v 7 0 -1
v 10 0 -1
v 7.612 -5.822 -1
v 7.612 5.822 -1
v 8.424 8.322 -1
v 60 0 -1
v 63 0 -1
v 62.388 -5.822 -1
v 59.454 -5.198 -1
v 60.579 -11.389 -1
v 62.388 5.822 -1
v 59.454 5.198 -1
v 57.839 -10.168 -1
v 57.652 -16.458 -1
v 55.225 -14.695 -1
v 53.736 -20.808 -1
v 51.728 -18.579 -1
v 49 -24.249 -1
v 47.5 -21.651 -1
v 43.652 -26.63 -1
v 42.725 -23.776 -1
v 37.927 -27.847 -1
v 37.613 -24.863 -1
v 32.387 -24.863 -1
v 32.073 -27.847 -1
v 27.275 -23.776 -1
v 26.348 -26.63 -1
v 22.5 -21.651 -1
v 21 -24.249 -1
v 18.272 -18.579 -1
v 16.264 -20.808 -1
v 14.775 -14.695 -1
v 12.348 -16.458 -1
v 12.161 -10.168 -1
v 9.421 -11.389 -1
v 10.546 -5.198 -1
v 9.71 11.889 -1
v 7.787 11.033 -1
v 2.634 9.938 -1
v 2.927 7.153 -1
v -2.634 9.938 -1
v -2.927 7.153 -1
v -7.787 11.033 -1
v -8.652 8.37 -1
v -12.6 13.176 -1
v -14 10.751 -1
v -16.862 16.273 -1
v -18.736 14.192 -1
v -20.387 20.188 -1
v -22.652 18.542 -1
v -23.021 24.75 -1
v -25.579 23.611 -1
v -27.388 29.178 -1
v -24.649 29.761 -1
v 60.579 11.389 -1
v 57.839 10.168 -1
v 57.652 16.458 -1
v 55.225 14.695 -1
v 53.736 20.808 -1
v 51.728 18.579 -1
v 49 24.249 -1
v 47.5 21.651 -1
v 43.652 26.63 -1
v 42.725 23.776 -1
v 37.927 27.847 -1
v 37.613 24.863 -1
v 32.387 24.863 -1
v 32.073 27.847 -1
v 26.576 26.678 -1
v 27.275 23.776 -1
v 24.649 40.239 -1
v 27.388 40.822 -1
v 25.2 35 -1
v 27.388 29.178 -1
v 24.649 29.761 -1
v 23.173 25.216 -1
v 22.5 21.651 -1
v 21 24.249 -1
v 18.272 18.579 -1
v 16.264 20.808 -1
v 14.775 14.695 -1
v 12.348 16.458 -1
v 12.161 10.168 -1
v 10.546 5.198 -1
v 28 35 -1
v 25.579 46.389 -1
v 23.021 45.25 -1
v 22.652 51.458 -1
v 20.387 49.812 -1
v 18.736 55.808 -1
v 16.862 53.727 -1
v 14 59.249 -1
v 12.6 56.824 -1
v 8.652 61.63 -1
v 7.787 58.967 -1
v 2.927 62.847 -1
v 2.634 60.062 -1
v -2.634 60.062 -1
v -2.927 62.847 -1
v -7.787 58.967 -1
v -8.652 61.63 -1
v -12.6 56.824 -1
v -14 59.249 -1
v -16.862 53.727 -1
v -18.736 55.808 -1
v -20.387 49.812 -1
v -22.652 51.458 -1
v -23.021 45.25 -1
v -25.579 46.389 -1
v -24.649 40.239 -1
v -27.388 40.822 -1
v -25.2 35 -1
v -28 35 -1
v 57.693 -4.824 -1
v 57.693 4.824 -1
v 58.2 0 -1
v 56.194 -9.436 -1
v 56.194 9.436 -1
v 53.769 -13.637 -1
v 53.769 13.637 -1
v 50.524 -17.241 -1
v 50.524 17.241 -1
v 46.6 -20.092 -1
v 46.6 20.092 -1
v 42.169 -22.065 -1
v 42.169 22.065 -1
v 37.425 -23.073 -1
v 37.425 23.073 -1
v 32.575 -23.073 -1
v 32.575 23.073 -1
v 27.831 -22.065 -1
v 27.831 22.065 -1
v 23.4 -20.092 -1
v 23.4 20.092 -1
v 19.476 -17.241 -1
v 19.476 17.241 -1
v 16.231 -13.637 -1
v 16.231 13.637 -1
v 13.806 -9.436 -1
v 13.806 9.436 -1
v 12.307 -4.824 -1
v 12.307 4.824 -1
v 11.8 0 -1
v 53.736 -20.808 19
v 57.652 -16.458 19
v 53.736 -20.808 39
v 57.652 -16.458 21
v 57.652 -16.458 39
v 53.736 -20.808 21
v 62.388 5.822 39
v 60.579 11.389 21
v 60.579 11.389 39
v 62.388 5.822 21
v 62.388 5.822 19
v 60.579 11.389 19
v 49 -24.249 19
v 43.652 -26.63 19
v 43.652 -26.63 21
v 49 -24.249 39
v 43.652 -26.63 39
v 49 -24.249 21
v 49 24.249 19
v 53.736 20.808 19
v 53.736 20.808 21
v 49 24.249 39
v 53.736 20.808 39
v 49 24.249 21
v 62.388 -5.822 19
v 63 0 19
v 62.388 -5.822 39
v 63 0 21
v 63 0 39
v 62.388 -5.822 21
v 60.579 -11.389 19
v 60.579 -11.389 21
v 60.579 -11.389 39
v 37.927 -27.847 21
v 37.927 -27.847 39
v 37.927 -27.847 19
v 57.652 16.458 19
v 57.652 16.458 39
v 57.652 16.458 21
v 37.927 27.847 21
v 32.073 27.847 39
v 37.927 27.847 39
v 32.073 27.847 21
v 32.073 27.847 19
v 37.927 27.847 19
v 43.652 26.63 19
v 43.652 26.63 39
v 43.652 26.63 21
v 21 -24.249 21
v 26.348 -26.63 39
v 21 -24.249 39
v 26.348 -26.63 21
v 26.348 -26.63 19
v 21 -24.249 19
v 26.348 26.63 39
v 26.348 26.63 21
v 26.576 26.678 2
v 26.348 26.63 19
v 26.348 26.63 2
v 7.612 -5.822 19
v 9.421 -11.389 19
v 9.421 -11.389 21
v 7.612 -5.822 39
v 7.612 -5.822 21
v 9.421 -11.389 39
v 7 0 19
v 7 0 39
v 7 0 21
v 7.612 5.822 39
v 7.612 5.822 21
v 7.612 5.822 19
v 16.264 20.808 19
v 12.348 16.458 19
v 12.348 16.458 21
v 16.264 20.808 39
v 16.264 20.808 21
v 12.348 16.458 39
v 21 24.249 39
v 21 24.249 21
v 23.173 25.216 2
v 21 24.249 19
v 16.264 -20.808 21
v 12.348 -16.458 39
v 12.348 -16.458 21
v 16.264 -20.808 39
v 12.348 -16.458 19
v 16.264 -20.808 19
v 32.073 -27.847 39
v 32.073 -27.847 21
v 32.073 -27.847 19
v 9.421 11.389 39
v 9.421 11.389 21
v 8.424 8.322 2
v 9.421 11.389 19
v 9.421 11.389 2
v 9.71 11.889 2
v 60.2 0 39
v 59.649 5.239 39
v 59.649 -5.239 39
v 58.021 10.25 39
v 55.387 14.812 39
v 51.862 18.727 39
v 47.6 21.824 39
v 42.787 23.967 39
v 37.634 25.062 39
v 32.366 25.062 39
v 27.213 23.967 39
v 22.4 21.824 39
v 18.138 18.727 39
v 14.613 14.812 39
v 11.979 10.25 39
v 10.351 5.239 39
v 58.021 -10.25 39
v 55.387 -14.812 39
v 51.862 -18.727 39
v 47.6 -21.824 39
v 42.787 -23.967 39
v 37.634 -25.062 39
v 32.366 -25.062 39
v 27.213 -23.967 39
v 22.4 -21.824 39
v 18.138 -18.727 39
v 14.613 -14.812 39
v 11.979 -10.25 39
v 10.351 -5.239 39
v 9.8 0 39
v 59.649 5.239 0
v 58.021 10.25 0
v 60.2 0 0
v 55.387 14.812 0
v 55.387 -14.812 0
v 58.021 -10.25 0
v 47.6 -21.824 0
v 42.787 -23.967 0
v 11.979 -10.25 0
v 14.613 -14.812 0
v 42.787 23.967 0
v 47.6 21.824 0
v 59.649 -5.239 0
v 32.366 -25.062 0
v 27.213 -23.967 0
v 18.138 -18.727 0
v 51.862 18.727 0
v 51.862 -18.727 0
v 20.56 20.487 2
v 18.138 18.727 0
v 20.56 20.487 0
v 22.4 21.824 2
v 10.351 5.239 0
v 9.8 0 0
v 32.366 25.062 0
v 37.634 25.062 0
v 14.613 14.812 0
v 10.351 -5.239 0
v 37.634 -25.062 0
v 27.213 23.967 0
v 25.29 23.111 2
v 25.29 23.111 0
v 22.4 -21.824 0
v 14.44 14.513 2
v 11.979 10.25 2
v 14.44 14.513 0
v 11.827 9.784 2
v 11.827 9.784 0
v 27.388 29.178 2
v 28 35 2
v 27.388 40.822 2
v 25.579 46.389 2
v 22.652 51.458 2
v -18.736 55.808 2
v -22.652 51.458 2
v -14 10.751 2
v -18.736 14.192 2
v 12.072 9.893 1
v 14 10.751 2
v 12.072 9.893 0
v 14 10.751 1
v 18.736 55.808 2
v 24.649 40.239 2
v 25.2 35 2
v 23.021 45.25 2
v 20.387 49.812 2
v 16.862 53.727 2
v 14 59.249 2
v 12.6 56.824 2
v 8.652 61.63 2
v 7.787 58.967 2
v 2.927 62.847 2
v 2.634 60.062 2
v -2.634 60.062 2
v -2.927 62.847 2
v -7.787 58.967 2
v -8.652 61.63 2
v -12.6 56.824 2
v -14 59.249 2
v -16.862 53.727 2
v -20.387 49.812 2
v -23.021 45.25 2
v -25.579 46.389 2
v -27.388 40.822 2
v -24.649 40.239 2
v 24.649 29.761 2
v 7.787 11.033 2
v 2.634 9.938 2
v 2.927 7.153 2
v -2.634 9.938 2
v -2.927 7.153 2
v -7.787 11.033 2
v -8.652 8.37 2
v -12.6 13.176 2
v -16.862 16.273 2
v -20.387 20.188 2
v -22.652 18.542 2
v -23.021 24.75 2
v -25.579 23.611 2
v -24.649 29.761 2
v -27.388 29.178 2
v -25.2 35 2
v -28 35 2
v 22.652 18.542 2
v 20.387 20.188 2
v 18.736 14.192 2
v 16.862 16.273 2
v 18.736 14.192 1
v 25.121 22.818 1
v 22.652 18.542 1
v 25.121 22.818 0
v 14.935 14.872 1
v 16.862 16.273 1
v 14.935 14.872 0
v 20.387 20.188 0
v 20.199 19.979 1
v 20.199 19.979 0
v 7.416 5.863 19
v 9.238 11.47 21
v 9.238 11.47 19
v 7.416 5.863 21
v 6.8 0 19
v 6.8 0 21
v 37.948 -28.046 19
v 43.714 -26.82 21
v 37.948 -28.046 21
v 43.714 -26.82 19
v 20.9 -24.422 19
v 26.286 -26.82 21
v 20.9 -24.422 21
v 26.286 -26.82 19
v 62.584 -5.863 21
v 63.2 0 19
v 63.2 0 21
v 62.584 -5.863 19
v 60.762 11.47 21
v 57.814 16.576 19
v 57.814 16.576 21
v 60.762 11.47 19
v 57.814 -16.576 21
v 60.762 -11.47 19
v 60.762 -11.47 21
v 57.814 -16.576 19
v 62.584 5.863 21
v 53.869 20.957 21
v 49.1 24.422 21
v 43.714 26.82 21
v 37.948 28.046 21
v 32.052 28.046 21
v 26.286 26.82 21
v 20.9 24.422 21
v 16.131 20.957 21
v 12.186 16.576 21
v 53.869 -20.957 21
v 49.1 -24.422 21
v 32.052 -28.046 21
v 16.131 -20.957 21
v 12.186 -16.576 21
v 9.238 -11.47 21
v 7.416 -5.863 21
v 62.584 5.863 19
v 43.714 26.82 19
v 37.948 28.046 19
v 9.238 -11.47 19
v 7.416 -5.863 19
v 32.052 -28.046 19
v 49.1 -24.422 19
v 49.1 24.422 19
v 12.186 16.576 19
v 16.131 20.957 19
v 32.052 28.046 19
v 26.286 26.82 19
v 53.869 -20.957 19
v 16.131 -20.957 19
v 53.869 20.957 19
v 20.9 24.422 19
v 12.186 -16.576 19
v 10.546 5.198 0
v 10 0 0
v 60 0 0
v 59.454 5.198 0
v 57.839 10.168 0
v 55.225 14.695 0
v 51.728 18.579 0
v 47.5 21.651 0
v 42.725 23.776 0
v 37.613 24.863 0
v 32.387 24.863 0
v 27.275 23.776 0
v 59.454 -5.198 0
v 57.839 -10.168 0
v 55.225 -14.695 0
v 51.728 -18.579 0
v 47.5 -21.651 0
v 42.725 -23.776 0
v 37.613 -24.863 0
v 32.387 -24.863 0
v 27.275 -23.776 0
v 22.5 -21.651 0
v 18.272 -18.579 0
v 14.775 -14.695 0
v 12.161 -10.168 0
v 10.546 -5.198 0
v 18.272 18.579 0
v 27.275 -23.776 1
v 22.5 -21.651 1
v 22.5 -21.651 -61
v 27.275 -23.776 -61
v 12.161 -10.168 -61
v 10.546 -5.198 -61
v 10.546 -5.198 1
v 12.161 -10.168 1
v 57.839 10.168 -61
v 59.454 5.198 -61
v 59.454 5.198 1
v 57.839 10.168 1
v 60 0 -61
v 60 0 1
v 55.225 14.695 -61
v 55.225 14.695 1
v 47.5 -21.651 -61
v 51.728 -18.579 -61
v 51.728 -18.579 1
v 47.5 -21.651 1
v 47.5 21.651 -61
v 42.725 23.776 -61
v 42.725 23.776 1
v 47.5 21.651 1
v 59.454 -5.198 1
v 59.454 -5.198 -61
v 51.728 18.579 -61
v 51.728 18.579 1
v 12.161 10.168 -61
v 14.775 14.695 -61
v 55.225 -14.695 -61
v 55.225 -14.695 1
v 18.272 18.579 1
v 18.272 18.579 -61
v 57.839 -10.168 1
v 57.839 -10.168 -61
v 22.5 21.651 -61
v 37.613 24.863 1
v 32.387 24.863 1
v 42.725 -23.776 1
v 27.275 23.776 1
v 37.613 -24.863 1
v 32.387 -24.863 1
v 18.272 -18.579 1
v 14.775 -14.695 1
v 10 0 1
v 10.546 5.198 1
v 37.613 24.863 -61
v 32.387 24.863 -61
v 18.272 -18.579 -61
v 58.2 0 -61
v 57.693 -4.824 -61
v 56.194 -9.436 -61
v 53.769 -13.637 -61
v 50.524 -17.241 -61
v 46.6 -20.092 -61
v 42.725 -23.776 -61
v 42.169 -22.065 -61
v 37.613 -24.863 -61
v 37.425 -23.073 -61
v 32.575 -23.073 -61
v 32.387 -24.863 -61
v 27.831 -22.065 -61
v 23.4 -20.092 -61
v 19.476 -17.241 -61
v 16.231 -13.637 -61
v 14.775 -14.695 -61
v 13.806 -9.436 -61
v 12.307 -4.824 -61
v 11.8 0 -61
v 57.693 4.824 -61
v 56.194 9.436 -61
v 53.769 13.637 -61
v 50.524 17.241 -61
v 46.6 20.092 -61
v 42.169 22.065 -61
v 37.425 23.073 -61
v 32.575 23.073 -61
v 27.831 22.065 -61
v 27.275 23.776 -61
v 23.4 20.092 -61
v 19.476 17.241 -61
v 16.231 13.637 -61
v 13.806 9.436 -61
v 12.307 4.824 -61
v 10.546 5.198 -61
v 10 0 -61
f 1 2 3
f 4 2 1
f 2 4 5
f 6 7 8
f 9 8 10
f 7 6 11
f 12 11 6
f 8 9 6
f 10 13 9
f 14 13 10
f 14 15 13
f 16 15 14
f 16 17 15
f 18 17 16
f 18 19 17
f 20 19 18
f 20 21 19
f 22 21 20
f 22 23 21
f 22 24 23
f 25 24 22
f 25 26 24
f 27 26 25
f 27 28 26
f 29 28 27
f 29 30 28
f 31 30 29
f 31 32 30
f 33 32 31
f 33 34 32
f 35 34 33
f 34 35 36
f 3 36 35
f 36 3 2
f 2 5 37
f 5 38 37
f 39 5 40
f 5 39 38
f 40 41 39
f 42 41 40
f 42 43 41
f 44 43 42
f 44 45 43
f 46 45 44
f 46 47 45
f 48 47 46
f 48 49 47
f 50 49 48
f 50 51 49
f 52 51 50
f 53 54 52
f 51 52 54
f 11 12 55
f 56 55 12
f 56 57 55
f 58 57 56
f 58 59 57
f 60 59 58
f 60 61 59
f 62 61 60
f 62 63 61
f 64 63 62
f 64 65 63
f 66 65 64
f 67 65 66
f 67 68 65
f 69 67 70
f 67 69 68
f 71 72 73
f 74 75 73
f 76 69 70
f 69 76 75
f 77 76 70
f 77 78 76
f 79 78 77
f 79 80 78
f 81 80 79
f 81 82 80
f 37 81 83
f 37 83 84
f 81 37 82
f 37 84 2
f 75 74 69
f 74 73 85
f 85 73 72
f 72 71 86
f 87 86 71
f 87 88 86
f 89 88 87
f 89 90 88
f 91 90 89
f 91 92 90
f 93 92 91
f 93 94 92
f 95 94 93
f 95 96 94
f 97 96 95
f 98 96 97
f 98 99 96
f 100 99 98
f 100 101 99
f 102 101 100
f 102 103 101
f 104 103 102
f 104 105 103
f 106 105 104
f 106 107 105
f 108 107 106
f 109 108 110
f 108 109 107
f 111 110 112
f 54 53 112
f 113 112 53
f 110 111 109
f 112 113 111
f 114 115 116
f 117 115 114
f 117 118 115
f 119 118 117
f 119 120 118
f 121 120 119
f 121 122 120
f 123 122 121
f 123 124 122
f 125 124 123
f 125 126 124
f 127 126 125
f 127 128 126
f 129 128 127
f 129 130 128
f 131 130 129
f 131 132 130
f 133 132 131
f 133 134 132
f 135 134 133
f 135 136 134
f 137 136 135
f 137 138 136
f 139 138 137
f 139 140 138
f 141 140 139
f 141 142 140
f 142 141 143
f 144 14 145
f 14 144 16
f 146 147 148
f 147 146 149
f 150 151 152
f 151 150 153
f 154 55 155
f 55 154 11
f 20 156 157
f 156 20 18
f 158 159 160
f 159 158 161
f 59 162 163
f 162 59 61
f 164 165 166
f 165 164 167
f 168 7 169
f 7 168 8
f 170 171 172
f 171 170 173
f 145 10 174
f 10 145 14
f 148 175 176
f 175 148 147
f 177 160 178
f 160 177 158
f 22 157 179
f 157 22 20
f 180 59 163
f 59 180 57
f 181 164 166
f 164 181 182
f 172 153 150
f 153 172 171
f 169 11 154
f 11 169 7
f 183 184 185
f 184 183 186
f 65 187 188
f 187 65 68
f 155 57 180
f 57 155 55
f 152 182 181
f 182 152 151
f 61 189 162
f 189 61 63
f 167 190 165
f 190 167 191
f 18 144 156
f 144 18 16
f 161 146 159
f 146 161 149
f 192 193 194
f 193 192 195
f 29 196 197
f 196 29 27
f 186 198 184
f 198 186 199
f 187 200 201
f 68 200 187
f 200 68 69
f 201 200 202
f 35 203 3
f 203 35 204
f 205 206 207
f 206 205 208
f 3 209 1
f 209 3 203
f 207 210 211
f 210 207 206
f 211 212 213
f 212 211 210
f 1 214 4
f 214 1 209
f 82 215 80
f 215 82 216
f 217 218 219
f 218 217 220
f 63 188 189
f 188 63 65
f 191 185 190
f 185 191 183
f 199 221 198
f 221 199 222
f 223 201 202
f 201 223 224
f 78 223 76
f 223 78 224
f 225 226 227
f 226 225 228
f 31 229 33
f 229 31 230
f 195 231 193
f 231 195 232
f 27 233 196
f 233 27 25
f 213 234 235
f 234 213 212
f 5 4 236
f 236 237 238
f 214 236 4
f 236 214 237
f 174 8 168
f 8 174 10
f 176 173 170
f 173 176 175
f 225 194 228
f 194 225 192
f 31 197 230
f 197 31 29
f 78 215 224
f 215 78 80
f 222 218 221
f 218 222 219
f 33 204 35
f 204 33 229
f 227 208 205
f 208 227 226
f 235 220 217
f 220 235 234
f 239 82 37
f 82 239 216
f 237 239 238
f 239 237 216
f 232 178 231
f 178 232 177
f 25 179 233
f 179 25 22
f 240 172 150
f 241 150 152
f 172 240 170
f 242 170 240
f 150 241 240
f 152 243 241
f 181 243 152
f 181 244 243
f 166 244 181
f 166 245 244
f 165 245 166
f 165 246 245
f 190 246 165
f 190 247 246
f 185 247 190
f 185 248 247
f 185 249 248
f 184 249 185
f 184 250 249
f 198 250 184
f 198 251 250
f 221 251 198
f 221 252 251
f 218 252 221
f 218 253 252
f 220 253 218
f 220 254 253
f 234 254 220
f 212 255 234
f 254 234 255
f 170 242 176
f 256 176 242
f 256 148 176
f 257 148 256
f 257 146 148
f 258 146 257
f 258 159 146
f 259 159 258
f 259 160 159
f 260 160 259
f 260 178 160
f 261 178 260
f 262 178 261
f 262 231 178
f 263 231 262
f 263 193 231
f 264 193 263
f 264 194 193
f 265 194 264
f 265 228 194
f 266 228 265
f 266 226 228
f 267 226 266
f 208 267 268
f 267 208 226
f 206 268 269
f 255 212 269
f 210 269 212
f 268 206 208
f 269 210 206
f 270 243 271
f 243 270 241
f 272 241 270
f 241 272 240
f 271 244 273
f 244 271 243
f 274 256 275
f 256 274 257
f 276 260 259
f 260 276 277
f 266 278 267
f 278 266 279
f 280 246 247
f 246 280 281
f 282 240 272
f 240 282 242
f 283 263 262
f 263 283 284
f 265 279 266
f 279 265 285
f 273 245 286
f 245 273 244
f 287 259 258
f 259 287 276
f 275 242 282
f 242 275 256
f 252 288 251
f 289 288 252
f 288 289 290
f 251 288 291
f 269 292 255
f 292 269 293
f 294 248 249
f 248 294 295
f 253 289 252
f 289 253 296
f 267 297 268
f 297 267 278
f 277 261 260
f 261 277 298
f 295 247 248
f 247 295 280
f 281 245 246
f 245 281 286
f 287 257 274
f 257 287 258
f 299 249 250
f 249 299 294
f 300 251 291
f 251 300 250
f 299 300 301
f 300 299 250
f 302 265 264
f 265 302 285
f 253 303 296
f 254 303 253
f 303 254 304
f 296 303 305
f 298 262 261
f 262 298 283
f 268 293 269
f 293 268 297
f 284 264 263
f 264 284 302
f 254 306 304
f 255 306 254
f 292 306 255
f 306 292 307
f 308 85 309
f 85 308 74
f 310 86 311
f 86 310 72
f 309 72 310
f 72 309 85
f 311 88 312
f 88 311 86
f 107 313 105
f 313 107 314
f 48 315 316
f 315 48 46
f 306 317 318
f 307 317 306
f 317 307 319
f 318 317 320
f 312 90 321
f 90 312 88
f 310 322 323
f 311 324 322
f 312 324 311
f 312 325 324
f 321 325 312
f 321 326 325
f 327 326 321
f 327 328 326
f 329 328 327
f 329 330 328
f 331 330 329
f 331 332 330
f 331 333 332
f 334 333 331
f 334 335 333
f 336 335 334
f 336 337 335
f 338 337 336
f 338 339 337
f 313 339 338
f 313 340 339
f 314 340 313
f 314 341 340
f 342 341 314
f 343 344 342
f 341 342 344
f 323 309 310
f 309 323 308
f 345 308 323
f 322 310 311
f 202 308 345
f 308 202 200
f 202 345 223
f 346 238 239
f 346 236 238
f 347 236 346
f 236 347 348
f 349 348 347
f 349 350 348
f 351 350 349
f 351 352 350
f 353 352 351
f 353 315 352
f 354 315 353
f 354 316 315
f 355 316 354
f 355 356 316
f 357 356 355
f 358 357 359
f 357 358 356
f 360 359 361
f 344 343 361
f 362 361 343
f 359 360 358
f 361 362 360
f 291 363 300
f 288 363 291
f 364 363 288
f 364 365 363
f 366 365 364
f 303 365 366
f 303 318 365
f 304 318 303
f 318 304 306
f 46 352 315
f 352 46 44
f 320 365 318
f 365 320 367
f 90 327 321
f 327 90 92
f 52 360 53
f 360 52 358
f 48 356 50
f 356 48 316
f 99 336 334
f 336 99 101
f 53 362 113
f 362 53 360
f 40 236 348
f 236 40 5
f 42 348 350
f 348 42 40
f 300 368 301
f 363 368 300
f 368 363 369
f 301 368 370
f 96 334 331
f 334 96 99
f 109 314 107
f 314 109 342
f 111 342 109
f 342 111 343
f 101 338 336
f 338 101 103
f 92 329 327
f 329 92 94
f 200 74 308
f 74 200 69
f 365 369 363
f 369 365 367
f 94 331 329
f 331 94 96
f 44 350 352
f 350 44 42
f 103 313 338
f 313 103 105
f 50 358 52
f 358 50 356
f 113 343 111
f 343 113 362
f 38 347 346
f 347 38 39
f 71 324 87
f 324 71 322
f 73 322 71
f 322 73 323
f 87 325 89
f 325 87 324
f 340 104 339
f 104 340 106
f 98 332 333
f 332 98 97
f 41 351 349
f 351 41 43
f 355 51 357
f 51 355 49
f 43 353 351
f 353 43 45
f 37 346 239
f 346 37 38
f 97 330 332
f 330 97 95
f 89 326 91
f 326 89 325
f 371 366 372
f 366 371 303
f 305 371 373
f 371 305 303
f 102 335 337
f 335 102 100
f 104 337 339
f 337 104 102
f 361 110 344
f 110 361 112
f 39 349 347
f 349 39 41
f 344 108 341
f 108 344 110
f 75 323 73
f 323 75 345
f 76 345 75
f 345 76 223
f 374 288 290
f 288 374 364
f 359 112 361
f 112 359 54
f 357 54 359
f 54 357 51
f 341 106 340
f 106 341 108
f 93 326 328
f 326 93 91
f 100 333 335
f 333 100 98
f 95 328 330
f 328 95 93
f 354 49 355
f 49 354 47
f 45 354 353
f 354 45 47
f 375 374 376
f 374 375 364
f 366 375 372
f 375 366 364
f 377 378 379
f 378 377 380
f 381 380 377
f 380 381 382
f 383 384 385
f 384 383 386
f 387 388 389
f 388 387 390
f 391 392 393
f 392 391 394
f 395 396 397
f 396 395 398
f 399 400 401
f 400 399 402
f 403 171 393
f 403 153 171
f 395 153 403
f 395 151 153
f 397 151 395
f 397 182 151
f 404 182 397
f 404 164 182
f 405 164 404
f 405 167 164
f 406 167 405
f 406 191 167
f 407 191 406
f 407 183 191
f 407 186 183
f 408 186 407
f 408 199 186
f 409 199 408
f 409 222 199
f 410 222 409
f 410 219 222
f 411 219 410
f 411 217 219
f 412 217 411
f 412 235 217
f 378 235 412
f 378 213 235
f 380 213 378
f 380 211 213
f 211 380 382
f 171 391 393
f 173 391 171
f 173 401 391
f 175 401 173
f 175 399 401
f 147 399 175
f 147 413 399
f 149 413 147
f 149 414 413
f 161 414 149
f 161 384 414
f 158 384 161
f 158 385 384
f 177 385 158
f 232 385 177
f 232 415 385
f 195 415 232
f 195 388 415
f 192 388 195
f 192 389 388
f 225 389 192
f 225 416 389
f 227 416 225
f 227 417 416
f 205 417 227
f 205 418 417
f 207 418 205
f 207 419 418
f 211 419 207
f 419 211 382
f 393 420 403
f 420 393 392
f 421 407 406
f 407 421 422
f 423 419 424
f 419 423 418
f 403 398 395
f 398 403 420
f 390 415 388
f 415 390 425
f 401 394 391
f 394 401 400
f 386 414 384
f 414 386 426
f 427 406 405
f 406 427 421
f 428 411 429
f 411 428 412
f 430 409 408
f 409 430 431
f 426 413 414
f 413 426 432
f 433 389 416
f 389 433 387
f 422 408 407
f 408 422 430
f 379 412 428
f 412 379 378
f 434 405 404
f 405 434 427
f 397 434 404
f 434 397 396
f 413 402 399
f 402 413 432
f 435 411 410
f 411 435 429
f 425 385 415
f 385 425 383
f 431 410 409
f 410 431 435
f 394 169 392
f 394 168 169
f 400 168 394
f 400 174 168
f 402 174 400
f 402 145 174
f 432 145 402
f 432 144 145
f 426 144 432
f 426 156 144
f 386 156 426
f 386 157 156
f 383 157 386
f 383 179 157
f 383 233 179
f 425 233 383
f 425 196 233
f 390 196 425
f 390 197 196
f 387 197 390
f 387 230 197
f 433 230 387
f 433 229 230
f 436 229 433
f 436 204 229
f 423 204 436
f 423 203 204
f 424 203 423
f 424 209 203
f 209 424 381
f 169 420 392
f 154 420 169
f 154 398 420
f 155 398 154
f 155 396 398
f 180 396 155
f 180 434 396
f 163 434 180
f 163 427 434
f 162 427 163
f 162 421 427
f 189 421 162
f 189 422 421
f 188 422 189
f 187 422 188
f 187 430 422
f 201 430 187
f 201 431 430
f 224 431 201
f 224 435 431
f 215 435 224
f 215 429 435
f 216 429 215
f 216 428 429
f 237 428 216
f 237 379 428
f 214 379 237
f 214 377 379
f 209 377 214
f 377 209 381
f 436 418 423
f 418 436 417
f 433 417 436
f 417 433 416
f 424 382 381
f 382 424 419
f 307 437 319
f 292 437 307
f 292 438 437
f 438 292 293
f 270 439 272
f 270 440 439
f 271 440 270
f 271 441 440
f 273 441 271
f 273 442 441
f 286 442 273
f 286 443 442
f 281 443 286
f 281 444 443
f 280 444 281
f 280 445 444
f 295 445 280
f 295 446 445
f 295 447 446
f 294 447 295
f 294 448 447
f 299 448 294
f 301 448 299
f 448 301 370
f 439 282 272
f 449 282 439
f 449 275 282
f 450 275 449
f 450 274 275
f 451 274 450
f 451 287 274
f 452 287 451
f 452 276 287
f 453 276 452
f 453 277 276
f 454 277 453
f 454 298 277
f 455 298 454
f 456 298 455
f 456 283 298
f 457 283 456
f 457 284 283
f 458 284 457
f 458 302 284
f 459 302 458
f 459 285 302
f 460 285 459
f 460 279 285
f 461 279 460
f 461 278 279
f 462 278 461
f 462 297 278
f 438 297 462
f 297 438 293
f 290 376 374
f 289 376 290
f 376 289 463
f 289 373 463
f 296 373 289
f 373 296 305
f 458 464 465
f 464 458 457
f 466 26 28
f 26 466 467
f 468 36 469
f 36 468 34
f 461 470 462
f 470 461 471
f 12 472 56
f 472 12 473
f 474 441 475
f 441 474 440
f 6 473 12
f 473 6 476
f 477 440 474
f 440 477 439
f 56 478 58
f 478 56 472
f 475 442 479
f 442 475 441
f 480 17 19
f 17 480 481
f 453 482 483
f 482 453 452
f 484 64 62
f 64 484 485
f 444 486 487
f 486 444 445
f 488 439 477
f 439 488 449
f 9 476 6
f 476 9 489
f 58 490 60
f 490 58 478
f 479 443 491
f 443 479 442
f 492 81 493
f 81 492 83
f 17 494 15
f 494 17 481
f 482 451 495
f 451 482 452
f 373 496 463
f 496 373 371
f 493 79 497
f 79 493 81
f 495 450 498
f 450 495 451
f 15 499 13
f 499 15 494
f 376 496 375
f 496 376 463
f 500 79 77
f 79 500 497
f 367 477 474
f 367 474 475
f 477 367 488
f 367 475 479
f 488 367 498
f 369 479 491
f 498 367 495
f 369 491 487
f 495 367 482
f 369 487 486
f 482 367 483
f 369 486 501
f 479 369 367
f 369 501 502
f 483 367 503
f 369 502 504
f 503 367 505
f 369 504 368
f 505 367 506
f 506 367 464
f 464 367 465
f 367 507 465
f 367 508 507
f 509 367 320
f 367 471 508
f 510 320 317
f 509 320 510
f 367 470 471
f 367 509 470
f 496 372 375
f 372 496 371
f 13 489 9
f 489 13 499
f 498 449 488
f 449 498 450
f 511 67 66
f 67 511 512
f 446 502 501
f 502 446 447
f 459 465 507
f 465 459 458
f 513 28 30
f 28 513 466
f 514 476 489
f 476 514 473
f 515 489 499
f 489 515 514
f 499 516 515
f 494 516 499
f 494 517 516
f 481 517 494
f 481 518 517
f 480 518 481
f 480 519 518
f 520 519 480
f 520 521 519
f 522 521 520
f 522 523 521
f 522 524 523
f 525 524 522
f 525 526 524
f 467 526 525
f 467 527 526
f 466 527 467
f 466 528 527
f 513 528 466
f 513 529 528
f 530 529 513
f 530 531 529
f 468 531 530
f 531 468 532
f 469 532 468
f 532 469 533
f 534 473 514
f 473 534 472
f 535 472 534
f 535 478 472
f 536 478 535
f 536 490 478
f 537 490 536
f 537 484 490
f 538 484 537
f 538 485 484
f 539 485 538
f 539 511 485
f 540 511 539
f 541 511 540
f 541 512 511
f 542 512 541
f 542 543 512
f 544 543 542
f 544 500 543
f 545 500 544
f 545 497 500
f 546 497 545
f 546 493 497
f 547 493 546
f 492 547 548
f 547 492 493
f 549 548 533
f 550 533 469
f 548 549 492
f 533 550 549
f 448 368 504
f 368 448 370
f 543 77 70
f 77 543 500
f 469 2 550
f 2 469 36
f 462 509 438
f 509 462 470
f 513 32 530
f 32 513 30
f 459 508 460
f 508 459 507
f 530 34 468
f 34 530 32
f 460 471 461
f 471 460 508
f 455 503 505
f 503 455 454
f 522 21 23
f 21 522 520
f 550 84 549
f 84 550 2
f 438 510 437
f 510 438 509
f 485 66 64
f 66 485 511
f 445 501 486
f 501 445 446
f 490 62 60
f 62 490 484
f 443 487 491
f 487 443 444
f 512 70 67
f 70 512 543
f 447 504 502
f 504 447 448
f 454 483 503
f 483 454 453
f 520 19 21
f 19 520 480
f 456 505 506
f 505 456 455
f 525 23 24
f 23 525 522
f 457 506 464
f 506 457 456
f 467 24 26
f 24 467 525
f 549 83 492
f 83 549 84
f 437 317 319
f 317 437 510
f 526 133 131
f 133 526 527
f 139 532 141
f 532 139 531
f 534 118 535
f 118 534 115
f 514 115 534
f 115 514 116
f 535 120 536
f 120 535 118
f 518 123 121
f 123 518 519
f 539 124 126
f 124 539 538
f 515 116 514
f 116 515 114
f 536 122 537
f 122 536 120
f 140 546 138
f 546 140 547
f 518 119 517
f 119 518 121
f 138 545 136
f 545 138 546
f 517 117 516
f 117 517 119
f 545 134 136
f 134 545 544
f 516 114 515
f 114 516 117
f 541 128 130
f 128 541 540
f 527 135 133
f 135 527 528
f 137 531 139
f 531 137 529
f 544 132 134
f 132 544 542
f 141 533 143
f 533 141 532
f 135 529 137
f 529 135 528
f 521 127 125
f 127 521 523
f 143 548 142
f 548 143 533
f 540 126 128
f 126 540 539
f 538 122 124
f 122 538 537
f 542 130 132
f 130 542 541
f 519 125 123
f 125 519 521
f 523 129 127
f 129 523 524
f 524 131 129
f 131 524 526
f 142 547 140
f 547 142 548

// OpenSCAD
// Parameters
pipe_od = 50; //[25:100:1]
pipe_wall = 1.8; //[0.9:3.6:0.1]
socket_depth = 40; //[20:80:1]
cap_wall = 3; //[1.5:6:0.1]
bend_radius_centerline = 35; //[18:70:1]
angle_deg = 90; //[45:120:1]
clearance = 0.2; //[0.0:0.6:0.05]
chamfer_lead_in = 1; //[0:3:0.1]
stop_ring_thickness = 2; //[1:4:0.1]
stop_ring_offset_from_mouth = 20; //[5:60:1]
overlap = 1; //[0.5:2:0.1]
pipe_stub_length = 60; //[20:120:1]

// Derived
outer_r = pipe_od/2 + cap_wall;
inner_r = pipe_od/2 + clearance;

// HT Pipe - complete geometry
module ht_pipe() {
  difference() {
    cylinder(r=pipe_od/2, h=pipe_stub_length + 2*overlap, center=true);
    translate([0, 0, -overlap])
      cylinder(r=pipe_od/2 - pipe_wall, h=pipe_stub_length + 2*overlap, center=true);
  }
}

// 90-degree cap fitting
module cap_fitting() {
  union() {
    // 90-degree cap body shell
    difference() {
      intersection() {
        // Outer torus
        rotate_extrude(angle=angle_deg)
          translate([bend_radius_centerline + outer_r, 0, 0])
            circle(r=outer_r);

        // Socket interface outer cylinder
        translate([bend_radius_centerline, 0, socket_depth/2 - overlap])
          cylinder(r=outer_r, h=socket_depth, center=true);

        // End cap closure outer cylinder
        translate([0, bend_radius_centerline, cap_wall/2 - overlap])
          cylinder(r=outer_r, h=cap_wall, center=true);
      }
      intersection() {
        // Inner torus
        rotate_extrude(angle=angle_deg)
          translate([bend_radius_centerline + inner_r, 0, 0])
            circle(r=inner_r);

        // Socket interface inner cylinder
        translate([bend_radius_centerline, 0, socket_depth/2 - overlap])
          cylinder(r=inner_r, h=socket_depth + 2*overlap, center=true);

        // End cap closure inner relief cylinder
        translate([0, bend_radius_centerline, cap_wall/2 - overlap])
          cylinder(r=inner_r, h=cap_wall + 2*overlap, center=true);
      }
    }

    // Socket interface shell
    difference() {
      translate([bend_radius_centerline, 0, socket_depth/2 - overlap])
        cylinder(r=outer_r, h=socket_depth, center=true);
      translate([bend_radius_centerline, 0, socket_depth/2 - overlap])
        cylinder(r=inner_r, h=socket_depth + 2*overlap, center=true);
    }

    // End cap closure solid
    difference() {
      translate([0, bend_radius_centerline, cap_wall/2 - overlap])
        cylinder(r=outer_r, h=cap_wall, center=true);
      translate([0, bend_radius_centerline, cap_wall/2 - overlap])
        cylinder(r=inner_r, h=cap_wall + 2*overlap, center=true);
    }

    // Internal stop ring
    difference() {
      translate([bend_radius_centerline, 0, stop_ring_offset_from_mouth + stop_ring_thickness/2 - overlap])
        cylinder(r=inner_r + cap_wall, h=stop_ring_thickness, center=true);
      translate([bend_radius_centerline, 0, stop_ring_offset_from_mouth + stop_ring_thickness/2 - overlap])
        cylinder(r=inner_r, h=stop_ring_thickness + 2*overlap, center=true);
    }

    // Socket lead-in cone
    translate([bend_radius_centerline, 0, chamfer_lead_in/2 - overlap])
      rotate([180, 0, 0])
        cylinder(r1=outer_r, r2=inner_r, h=chamfer_lead_in, center=true);
  }
}

// Assembly: attach the "circular ring/loop" (pipe stub) to the socket mouth with real intersection.
// Socket mouth plane is at z = -overlap (because socket cylinder is centered at socket_depth/2 - overlap).
// Place pipe so its top face goes INSIDE the socket by `overlap` (1-2mm) to guarantee connection.
module assembly() {
  // Mouth plane (global Z) of the socket opening:
  mouth_z = -overlap;

  // Pipe is centered; its top face is at (center_z + pipe_stub_length/2).
  // Enforce: top_face_z = mouth_z + overlap  => center_z = mouth_z + overlap - pipe_stub_length/2
  // This yields a guaranteed penetration of `overlap` into the socket.
  pipe_center_z = mouth_z + overlap - pipe_stub_length/2;

  color([0.85, 0.85, 0.8])
  union() {
    cap_fitting();

    // Connected pipe stub (no floating ring)
    translate([bend_radius_centerline, 0, pipe_center_z])
      ht_pipe();
  }
}

assembly();
